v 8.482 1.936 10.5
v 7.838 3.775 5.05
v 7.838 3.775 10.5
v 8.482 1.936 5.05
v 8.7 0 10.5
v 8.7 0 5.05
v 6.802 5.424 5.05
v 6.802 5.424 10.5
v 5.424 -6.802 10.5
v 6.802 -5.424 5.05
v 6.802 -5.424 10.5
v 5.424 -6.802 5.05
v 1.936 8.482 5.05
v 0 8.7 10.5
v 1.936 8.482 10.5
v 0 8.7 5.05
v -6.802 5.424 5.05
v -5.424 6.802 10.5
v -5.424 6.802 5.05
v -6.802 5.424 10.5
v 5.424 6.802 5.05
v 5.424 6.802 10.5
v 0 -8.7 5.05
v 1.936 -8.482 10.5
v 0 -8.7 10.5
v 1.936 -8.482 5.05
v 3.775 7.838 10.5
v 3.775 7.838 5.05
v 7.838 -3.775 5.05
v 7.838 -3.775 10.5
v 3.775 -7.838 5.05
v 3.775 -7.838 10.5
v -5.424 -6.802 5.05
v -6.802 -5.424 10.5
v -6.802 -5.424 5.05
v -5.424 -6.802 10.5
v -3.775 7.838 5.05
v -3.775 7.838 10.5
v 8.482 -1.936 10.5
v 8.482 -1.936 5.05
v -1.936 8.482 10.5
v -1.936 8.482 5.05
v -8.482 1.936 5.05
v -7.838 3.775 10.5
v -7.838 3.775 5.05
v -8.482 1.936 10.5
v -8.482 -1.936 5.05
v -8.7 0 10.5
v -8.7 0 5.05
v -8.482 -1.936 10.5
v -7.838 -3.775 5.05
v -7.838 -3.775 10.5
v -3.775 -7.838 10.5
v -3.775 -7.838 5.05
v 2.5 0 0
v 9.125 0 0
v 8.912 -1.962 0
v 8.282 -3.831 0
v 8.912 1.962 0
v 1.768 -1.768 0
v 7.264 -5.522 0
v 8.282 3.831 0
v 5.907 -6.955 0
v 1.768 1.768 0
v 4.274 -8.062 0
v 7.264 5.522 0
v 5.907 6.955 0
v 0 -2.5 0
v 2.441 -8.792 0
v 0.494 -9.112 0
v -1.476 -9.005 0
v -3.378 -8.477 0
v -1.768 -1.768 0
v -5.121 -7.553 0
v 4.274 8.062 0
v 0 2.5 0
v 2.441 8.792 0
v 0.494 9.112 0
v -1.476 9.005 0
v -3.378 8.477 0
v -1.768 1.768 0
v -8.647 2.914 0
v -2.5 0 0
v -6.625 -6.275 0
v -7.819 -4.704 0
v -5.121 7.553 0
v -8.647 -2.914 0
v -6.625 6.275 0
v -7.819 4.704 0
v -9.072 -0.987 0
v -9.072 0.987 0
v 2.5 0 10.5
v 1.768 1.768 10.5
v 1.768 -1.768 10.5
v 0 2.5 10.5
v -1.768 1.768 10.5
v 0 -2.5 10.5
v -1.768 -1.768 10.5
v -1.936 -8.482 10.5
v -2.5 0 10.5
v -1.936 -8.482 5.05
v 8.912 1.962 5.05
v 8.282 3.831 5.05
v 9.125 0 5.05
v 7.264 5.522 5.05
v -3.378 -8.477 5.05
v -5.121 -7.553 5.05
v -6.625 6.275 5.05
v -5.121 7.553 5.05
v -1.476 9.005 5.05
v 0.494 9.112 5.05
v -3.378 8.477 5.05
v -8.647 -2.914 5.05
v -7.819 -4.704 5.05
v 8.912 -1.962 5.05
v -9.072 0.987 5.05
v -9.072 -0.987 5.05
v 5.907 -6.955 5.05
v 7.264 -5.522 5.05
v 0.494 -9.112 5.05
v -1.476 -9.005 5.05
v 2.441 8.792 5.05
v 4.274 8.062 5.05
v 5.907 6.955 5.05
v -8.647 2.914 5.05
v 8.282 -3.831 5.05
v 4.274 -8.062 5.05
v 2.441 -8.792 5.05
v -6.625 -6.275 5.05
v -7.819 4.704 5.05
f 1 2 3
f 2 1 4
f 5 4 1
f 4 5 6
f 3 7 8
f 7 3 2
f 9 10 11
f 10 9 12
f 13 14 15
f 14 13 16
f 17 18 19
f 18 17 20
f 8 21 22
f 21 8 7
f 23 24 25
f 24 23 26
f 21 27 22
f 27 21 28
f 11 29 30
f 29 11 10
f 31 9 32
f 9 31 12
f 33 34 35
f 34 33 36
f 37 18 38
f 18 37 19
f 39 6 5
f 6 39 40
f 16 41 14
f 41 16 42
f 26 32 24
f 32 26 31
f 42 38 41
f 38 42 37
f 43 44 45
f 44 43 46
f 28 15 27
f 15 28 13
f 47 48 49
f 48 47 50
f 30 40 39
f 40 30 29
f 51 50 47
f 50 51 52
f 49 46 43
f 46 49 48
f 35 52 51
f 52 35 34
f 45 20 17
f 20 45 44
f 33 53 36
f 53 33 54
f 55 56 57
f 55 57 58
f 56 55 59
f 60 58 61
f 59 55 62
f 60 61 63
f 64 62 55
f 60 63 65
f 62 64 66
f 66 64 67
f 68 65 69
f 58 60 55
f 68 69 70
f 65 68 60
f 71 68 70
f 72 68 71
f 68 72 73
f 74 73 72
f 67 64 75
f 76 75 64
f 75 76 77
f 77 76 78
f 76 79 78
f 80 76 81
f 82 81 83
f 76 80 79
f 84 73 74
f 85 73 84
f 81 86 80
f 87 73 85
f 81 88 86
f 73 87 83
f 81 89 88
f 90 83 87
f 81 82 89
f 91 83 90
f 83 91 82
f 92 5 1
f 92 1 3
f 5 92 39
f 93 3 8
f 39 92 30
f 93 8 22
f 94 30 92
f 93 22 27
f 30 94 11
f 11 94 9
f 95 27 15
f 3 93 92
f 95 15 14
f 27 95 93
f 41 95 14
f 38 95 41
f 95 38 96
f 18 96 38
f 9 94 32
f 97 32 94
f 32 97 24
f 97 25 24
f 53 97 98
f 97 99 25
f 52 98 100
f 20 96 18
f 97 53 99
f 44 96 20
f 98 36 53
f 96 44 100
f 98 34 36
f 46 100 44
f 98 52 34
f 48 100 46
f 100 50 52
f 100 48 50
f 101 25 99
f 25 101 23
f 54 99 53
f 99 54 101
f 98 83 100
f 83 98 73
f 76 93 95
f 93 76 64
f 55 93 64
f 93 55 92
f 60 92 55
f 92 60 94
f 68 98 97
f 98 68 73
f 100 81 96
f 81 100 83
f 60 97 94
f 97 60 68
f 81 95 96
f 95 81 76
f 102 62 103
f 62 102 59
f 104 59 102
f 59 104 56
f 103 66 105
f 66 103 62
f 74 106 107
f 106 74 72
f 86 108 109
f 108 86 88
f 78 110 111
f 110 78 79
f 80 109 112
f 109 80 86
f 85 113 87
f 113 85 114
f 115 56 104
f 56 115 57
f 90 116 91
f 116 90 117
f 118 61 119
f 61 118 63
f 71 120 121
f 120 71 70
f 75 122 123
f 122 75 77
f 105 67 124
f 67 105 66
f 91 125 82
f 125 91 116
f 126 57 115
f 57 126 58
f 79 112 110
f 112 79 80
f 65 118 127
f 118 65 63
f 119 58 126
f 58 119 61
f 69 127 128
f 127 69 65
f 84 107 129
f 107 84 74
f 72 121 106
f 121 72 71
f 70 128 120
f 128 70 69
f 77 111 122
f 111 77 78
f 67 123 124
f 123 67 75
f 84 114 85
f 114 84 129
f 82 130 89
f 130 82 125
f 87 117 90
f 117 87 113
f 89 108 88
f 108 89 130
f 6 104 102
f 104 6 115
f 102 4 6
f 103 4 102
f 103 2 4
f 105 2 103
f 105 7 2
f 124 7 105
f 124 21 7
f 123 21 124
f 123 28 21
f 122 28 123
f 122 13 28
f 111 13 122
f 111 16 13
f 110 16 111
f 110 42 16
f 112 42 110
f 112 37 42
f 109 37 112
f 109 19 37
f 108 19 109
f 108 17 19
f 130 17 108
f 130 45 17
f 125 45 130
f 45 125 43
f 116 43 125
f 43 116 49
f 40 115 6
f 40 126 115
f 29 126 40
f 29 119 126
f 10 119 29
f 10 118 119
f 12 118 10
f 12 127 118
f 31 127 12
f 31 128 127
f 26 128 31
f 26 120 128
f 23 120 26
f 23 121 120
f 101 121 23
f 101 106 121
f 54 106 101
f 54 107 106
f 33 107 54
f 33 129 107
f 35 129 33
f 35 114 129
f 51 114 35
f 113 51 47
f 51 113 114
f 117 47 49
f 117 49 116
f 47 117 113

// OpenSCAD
// replacement part
// spring spray nozzle inlay
d_base = 18.25; r1 = d_base/2;
d_head = 17.4;  r2 = d_head/2;
d_hole = 5;     r3 = d_hole/2; 
h_top  = 10.5;
h_base = 5.05;


difference(){
    cylinder(h=10.5, r=r2);
    cylinder(h=10.7, r=r3);
}
difference(){
    cylinder(h=5.05,  r=r1);
    cylinder(h=10.7,  r=r3);
}
